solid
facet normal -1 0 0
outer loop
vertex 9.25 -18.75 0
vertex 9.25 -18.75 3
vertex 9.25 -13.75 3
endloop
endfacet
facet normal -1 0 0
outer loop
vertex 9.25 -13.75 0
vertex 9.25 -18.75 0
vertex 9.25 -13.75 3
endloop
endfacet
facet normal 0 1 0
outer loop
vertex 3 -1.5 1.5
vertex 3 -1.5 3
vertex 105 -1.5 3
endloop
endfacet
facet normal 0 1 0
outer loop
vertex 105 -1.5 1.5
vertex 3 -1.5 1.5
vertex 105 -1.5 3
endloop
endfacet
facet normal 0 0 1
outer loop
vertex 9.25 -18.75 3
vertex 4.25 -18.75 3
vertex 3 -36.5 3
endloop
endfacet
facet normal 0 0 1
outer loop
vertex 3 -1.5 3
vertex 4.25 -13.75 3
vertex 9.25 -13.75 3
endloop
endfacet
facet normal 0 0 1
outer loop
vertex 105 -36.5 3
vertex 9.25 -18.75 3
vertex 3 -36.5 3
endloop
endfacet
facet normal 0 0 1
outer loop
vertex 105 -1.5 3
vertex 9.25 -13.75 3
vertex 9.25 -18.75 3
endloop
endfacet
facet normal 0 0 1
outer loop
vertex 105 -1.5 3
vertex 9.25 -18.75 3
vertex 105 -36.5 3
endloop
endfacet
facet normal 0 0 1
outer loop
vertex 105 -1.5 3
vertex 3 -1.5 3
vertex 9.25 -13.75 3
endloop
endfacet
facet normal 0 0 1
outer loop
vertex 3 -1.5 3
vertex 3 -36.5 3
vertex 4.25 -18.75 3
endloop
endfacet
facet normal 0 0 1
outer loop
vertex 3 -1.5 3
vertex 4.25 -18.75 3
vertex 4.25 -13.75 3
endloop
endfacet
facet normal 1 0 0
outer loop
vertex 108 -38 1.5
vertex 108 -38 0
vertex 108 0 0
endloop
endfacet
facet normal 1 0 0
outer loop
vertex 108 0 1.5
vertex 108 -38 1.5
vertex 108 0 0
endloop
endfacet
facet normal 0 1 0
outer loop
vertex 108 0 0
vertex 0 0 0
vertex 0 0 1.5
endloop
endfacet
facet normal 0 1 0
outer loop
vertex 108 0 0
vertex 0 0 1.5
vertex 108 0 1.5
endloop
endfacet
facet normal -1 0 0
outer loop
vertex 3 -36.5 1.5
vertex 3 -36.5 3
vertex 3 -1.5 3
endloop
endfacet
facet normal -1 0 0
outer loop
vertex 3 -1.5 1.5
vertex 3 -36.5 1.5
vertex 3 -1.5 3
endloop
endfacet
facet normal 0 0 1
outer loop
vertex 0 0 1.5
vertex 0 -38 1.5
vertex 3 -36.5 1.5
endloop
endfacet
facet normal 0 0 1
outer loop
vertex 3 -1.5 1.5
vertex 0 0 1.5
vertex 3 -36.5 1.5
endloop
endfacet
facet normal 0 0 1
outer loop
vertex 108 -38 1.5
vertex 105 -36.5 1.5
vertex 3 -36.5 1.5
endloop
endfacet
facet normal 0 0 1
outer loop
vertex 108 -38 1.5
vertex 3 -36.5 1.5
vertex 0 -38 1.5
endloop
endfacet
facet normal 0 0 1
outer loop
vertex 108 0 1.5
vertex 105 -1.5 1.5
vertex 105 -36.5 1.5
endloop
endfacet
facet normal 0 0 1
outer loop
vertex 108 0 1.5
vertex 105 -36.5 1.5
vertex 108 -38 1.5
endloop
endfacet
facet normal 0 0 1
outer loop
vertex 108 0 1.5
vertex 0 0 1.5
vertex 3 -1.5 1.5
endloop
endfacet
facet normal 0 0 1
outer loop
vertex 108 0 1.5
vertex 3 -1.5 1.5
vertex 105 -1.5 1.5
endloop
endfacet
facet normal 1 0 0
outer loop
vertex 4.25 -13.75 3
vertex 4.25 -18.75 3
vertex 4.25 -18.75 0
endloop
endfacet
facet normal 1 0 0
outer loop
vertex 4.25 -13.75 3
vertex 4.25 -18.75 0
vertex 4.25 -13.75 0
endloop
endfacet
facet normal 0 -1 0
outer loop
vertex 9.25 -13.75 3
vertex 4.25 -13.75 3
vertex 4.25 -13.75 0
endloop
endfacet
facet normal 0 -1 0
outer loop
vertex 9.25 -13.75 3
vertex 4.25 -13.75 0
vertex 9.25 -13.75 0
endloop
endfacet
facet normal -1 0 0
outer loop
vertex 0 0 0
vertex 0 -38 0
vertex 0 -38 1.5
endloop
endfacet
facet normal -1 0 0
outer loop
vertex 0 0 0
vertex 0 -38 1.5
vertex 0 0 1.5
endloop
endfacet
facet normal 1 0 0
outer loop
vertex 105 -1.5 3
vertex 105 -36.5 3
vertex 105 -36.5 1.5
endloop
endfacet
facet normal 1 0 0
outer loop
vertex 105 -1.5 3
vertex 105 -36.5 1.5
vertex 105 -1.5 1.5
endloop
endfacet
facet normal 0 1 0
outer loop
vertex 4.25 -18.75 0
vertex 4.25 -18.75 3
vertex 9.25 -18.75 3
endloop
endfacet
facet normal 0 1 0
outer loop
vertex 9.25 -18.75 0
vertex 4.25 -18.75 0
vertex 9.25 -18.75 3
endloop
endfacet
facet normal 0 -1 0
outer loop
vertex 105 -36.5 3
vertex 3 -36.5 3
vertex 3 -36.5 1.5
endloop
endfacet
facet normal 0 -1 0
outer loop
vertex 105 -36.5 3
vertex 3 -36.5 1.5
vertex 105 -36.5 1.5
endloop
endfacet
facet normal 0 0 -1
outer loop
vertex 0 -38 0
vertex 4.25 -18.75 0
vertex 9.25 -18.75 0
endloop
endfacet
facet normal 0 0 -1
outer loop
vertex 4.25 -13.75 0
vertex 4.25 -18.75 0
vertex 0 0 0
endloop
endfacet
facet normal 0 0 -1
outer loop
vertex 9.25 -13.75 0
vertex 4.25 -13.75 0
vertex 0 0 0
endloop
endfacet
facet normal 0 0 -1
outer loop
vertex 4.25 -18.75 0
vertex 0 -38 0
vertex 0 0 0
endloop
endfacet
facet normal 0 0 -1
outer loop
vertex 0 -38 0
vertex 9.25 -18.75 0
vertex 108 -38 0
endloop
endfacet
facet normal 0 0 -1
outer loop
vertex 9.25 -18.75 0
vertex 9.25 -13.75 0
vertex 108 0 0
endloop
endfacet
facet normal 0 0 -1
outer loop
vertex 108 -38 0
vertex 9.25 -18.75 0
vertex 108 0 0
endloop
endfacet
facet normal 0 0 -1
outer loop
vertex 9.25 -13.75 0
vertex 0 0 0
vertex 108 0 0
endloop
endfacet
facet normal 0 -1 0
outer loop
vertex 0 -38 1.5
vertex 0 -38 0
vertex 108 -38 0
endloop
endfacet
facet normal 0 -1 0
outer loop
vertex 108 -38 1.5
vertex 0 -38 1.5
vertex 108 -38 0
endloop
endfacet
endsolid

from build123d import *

# Parameters (mm, degrees)
SKETCH_W        = 108
SKETCH_H        = 38
PAD_DEPTH       = 3
SKETCH002_W     = 3
SKETCH002_H     = 38
POCKET_DEPTH    = 1.5
SKETCH003_W     = 3
SKETCH003_H     = 38
POCKET001_DEPTH = 1.5
SKETCH004_W     = 102
SKETCH004_H     = 1.5
POCKET002_DEPTH = 1.5
SKETCH005_W     = 102
SKETCH005_H     = 1.5
POCKET003_DEPTH = 1.5
SKETCH006_W     = 5
SKETCH006_H     = 5
POCKET004_DEPTH = 3


with BuildPart() as part:
    # Sketch → Pad (new body)
    with BuildSketch(Plane.XY):
        with Locations((54, -19)):
            Rectangle(SKETCH_W, SKETCH_H)
    extrude(amount=PAD_DEPTH)

    # Sketch002 (on Face6 of Pad) → Pocket (cut)
    with BuildSketch(Plane.XY.offset(3)):
        with Locations((1.5, -19)):
            Rectangle(SKETCH002_W, SKETCH002_H)
    extrude(amount=-POCKET_DEPTH, mode=Mode.SUBTRACT)

    # Sketch003 (on Face4 of Pocket) → Pocket001 (cut)
    with BuildSketch(Plane.XY.offset(3)):
        with Locations((106.5, -19)):
            Rectangle(SKETCH003_W, SKETCH003_H)
    extrude(amount=-POCKET001_DEPTH, mode=Mode.SUBTRACT)

    # Sketch004 (on Face6 of Pocket001) → Pocket002 (cut)
    with BuildSketch(Plane.XY.offset(3)):
        with Locations((54, -0.75)):
            Rectangle(SKETCH004_W, SKETCH004_H)
    extrude(amount=-POCKET002_DEPTH, mode=Mode.SUBTRACT)

    # Sketch005 (on Face12 of Pocket002) → Pocket003 (cut)
    with BuildSketch(Plane.XY.offset(3)):
        with Locations((54, -37.25)):
            Rectangle(SKETCH005_W, SKETCH005_H)
    extrude(amount=-POCKET003_DEPTH, mode=Mode.SUBTRACT)

    # Sketch006 (on Face13 of Pocket003) → Pocket004 (cut)
    with BuildSketch(Plane.XY.offset(3)):
        with Locations((6.75, -16.25)):
            Rectangle(SKETCH006_W, SKETCH006_H)
    extrude(amount=-POCKET004_DEPTH, mode=Mode.SUBTRACT)


solid = part.part
